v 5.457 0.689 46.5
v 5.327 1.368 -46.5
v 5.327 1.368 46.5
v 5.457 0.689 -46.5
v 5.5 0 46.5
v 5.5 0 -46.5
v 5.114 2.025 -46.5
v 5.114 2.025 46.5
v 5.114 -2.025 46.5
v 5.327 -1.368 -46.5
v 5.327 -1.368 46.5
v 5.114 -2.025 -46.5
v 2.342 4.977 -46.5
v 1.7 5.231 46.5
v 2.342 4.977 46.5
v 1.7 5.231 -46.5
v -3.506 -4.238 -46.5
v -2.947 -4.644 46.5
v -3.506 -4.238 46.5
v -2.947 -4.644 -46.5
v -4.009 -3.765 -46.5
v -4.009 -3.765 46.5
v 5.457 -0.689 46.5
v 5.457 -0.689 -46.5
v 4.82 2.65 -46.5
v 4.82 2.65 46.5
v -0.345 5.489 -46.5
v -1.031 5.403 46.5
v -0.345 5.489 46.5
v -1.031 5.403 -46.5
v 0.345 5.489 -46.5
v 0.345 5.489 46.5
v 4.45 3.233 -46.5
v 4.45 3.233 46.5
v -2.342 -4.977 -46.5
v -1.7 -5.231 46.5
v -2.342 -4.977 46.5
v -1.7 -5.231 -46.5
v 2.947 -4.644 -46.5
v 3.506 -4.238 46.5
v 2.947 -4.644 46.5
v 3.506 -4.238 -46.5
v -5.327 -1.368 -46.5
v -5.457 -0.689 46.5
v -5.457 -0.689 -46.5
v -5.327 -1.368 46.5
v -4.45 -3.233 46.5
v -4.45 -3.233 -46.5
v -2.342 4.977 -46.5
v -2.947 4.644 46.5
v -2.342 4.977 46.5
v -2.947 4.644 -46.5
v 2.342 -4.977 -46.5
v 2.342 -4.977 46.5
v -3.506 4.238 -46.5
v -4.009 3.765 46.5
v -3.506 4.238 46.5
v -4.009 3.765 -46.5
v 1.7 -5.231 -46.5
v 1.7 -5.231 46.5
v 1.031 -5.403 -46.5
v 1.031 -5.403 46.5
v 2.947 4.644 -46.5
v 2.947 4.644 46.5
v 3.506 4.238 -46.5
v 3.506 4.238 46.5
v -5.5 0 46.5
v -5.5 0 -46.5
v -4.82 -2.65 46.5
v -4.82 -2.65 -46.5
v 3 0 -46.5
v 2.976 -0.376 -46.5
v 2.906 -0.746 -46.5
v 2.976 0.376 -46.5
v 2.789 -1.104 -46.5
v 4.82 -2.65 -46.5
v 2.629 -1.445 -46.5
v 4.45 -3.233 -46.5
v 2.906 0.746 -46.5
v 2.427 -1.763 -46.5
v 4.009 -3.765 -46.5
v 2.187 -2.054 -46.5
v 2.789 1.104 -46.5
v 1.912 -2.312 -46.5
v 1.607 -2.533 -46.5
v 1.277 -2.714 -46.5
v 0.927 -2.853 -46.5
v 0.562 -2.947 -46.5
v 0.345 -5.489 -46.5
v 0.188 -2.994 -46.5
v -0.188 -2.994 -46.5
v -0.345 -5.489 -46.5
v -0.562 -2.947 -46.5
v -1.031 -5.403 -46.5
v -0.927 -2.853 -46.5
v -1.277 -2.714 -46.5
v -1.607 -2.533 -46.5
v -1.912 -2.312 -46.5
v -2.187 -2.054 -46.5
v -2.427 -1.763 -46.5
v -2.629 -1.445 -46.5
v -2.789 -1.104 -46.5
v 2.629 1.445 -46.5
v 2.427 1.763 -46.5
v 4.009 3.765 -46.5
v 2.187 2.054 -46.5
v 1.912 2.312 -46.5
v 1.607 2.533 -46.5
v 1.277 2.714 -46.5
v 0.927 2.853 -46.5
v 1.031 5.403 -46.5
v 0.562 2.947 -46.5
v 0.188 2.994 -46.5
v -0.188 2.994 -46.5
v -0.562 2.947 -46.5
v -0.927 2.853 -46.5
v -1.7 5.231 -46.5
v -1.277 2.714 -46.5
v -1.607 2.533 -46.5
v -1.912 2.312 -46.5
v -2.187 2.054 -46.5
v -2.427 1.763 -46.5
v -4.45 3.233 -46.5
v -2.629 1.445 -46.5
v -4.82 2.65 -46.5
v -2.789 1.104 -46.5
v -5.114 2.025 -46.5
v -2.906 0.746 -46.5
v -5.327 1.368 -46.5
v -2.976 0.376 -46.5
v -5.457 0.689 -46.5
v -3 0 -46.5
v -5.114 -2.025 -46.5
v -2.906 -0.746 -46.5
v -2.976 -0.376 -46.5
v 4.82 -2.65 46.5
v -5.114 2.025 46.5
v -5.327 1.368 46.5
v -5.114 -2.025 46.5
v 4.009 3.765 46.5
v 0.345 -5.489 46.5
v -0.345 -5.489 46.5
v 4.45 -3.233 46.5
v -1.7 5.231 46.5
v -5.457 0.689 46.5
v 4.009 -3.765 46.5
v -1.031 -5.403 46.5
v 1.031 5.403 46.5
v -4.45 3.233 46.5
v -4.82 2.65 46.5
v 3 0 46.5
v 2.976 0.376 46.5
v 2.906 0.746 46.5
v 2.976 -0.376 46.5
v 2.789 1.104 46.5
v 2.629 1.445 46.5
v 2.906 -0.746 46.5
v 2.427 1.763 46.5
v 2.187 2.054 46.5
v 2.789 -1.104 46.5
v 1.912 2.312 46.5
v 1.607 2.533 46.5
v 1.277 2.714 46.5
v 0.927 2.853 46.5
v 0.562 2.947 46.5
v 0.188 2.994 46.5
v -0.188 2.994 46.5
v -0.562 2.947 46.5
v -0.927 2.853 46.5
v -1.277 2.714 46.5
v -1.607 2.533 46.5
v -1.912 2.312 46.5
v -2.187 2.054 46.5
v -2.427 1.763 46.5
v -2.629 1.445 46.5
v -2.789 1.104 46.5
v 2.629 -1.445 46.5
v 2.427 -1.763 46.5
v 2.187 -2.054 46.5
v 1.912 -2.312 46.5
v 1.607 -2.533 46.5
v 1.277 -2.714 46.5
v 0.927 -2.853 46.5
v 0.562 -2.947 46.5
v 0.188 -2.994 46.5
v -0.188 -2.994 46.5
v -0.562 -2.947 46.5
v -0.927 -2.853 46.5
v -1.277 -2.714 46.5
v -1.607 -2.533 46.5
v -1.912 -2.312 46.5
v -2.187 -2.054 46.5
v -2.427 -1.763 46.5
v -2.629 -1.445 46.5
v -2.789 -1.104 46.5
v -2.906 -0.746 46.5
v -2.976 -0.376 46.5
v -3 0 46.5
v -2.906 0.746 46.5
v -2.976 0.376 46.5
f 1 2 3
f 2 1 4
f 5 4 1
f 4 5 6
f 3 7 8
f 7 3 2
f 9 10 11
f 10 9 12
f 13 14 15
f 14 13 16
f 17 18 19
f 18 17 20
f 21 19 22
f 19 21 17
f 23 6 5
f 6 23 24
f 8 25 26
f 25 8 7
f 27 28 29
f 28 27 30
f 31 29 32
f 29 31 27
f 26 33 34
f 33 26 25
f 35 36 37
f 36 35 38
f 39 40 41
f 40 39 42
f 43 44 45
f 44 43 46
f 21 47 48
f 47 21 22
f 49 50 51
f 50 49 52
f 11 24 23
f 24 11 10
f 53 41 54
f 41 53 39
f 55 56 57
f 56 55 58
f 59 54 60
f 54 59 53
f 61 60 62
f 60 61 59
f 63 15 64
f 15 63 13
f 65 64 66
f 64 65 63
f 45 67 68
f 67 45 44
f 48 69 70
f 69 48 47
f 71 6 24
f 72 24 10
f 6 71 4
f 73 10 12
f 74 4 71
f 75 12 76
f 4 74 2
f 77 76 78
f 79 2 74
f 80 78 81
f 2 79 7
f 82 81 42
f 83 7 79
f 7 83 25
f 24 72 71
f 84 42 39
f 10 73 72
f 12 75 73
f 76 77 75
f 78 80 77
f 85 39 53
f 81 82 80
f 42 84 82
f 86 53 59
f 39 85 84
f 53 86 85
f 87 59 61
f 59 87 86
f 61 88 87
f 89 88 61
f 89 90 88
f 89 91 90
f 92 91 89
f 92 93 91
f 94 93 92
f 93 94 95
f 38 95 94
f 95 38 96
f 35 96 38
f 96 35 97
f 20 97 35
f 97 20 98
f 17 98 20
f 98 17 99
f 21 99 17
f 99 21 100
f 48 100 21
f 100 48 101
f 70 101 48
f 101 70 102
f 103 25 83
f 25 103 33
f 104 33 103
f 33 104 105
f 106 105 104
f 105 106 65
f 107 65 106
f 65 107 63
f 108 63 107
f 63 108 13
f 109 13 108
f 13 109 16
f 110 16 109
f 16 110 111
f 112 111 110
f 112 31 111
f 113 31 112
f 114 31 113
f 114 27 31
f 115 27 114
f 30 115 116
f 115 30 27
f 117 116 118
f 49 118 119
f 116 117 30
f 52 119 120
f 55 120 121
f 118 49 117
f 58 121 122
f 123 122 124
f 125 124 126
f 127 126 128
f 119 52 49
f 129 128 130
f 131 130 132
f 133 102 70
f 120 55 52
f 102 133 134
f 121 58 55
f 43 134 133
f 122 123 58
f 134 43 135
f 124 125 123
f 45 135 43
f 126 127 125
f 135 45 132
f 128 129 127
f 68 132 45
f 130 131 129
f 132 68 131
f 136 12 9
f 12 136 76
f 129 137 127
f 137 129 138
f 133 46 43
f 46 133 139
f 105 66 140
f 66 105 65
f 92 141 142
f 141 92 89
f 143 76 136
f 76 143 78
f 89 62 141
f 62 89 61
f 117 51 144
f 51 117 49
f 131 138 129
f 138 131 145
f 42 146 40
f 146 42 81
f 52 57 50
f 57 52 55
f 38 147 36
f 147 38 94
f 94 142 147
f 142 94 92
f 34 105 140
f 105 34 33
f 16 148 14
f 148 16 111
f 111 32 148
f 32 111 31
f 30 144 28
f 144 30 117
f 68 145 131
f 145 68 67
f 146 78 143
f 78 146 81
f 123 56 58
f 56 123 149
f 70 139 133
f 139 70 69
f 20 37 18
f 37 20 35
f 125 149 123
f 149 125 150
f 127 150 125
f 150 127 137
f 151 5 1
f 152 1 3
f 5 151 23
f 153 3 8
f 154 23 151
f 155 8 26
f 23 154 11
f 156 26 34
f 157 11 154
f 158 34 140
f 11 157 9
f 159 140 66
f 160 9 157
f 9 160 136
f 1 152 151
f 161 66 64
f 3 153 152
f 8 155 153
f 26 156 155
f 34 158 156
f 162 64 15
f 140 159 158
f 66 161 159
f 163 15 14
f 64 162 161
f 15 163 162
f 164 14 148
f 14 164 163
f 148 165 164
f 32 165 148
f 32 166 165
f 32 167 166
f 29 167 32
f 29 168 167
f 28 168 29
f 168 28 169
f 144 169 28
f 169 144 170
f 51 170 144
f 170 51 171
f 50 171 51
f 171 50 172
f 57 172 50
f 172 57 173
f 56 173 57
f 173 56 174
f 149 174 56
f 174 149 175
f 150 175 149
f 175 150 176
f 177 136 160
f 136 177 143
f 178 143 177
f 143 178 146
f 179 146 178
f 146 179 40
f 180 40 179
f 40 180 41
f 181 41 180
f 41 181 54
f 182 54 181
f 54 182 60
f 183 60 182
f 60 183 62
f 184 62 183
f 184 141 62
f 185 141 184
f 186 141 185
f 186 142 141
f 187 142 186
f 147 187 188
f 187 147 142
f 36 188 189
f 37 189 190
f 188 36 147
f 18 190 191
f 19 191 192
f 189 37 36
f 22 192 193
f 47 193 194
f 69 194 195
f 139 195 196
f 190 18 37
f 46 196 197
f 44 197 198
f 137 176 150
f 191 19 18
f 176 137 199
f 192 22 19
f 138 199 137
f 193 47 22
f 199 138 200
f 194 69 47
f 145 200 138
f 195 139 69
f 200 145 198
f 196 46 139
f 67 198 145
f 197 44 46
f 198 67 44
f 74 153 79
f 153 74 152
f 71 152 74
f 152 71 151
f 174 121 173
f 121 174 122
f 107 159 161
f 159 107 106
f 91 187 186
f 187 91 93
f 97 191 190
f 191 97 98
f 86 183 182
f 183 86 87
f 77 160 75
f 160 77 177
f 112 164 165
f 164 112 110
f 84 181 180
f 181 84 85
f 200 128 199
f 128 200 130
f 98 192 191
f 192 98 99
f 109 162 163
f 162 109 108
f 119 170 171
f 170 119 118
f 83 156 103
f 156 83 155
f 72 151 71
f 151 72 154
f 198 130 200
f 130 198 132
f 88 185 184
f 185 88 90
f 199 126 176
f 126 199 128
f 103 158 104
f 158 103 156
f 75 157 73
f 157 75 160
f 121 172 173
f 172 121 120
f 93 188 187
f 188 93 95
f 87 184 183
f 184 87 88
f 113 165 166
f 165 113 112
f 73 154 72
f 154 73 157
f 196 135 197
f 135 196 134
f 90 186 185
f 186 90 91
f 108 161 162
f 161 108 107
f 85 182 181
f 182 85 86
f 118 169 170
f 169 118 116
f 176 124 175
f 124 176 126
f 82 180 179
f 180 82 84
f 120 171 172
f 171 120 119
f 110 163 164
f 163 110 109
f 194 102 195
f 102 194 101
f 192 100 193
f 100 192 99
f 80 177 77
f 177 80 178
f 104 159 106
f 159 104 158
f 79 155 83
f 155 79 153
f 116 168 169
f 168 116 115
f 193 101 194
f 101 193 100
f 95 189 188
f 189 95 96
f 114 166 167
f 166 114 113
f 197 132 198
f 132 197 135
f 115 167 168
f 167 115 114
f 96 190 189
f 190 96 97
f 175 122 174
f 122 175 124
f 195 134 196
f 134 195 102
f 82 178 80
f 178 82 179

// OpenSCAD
$fn = 50;


difference() {
	union() {
		translate(v = [0, 0, -46.5000000000]) {
			cylinder(h = 93, r = 5.5000000000);
		}
	}
	union() {
		translate(v = [0, 0, -100.0000000000]) {
			cylinder(h = 200, r = 3.0000000000);
		}
	}
}
